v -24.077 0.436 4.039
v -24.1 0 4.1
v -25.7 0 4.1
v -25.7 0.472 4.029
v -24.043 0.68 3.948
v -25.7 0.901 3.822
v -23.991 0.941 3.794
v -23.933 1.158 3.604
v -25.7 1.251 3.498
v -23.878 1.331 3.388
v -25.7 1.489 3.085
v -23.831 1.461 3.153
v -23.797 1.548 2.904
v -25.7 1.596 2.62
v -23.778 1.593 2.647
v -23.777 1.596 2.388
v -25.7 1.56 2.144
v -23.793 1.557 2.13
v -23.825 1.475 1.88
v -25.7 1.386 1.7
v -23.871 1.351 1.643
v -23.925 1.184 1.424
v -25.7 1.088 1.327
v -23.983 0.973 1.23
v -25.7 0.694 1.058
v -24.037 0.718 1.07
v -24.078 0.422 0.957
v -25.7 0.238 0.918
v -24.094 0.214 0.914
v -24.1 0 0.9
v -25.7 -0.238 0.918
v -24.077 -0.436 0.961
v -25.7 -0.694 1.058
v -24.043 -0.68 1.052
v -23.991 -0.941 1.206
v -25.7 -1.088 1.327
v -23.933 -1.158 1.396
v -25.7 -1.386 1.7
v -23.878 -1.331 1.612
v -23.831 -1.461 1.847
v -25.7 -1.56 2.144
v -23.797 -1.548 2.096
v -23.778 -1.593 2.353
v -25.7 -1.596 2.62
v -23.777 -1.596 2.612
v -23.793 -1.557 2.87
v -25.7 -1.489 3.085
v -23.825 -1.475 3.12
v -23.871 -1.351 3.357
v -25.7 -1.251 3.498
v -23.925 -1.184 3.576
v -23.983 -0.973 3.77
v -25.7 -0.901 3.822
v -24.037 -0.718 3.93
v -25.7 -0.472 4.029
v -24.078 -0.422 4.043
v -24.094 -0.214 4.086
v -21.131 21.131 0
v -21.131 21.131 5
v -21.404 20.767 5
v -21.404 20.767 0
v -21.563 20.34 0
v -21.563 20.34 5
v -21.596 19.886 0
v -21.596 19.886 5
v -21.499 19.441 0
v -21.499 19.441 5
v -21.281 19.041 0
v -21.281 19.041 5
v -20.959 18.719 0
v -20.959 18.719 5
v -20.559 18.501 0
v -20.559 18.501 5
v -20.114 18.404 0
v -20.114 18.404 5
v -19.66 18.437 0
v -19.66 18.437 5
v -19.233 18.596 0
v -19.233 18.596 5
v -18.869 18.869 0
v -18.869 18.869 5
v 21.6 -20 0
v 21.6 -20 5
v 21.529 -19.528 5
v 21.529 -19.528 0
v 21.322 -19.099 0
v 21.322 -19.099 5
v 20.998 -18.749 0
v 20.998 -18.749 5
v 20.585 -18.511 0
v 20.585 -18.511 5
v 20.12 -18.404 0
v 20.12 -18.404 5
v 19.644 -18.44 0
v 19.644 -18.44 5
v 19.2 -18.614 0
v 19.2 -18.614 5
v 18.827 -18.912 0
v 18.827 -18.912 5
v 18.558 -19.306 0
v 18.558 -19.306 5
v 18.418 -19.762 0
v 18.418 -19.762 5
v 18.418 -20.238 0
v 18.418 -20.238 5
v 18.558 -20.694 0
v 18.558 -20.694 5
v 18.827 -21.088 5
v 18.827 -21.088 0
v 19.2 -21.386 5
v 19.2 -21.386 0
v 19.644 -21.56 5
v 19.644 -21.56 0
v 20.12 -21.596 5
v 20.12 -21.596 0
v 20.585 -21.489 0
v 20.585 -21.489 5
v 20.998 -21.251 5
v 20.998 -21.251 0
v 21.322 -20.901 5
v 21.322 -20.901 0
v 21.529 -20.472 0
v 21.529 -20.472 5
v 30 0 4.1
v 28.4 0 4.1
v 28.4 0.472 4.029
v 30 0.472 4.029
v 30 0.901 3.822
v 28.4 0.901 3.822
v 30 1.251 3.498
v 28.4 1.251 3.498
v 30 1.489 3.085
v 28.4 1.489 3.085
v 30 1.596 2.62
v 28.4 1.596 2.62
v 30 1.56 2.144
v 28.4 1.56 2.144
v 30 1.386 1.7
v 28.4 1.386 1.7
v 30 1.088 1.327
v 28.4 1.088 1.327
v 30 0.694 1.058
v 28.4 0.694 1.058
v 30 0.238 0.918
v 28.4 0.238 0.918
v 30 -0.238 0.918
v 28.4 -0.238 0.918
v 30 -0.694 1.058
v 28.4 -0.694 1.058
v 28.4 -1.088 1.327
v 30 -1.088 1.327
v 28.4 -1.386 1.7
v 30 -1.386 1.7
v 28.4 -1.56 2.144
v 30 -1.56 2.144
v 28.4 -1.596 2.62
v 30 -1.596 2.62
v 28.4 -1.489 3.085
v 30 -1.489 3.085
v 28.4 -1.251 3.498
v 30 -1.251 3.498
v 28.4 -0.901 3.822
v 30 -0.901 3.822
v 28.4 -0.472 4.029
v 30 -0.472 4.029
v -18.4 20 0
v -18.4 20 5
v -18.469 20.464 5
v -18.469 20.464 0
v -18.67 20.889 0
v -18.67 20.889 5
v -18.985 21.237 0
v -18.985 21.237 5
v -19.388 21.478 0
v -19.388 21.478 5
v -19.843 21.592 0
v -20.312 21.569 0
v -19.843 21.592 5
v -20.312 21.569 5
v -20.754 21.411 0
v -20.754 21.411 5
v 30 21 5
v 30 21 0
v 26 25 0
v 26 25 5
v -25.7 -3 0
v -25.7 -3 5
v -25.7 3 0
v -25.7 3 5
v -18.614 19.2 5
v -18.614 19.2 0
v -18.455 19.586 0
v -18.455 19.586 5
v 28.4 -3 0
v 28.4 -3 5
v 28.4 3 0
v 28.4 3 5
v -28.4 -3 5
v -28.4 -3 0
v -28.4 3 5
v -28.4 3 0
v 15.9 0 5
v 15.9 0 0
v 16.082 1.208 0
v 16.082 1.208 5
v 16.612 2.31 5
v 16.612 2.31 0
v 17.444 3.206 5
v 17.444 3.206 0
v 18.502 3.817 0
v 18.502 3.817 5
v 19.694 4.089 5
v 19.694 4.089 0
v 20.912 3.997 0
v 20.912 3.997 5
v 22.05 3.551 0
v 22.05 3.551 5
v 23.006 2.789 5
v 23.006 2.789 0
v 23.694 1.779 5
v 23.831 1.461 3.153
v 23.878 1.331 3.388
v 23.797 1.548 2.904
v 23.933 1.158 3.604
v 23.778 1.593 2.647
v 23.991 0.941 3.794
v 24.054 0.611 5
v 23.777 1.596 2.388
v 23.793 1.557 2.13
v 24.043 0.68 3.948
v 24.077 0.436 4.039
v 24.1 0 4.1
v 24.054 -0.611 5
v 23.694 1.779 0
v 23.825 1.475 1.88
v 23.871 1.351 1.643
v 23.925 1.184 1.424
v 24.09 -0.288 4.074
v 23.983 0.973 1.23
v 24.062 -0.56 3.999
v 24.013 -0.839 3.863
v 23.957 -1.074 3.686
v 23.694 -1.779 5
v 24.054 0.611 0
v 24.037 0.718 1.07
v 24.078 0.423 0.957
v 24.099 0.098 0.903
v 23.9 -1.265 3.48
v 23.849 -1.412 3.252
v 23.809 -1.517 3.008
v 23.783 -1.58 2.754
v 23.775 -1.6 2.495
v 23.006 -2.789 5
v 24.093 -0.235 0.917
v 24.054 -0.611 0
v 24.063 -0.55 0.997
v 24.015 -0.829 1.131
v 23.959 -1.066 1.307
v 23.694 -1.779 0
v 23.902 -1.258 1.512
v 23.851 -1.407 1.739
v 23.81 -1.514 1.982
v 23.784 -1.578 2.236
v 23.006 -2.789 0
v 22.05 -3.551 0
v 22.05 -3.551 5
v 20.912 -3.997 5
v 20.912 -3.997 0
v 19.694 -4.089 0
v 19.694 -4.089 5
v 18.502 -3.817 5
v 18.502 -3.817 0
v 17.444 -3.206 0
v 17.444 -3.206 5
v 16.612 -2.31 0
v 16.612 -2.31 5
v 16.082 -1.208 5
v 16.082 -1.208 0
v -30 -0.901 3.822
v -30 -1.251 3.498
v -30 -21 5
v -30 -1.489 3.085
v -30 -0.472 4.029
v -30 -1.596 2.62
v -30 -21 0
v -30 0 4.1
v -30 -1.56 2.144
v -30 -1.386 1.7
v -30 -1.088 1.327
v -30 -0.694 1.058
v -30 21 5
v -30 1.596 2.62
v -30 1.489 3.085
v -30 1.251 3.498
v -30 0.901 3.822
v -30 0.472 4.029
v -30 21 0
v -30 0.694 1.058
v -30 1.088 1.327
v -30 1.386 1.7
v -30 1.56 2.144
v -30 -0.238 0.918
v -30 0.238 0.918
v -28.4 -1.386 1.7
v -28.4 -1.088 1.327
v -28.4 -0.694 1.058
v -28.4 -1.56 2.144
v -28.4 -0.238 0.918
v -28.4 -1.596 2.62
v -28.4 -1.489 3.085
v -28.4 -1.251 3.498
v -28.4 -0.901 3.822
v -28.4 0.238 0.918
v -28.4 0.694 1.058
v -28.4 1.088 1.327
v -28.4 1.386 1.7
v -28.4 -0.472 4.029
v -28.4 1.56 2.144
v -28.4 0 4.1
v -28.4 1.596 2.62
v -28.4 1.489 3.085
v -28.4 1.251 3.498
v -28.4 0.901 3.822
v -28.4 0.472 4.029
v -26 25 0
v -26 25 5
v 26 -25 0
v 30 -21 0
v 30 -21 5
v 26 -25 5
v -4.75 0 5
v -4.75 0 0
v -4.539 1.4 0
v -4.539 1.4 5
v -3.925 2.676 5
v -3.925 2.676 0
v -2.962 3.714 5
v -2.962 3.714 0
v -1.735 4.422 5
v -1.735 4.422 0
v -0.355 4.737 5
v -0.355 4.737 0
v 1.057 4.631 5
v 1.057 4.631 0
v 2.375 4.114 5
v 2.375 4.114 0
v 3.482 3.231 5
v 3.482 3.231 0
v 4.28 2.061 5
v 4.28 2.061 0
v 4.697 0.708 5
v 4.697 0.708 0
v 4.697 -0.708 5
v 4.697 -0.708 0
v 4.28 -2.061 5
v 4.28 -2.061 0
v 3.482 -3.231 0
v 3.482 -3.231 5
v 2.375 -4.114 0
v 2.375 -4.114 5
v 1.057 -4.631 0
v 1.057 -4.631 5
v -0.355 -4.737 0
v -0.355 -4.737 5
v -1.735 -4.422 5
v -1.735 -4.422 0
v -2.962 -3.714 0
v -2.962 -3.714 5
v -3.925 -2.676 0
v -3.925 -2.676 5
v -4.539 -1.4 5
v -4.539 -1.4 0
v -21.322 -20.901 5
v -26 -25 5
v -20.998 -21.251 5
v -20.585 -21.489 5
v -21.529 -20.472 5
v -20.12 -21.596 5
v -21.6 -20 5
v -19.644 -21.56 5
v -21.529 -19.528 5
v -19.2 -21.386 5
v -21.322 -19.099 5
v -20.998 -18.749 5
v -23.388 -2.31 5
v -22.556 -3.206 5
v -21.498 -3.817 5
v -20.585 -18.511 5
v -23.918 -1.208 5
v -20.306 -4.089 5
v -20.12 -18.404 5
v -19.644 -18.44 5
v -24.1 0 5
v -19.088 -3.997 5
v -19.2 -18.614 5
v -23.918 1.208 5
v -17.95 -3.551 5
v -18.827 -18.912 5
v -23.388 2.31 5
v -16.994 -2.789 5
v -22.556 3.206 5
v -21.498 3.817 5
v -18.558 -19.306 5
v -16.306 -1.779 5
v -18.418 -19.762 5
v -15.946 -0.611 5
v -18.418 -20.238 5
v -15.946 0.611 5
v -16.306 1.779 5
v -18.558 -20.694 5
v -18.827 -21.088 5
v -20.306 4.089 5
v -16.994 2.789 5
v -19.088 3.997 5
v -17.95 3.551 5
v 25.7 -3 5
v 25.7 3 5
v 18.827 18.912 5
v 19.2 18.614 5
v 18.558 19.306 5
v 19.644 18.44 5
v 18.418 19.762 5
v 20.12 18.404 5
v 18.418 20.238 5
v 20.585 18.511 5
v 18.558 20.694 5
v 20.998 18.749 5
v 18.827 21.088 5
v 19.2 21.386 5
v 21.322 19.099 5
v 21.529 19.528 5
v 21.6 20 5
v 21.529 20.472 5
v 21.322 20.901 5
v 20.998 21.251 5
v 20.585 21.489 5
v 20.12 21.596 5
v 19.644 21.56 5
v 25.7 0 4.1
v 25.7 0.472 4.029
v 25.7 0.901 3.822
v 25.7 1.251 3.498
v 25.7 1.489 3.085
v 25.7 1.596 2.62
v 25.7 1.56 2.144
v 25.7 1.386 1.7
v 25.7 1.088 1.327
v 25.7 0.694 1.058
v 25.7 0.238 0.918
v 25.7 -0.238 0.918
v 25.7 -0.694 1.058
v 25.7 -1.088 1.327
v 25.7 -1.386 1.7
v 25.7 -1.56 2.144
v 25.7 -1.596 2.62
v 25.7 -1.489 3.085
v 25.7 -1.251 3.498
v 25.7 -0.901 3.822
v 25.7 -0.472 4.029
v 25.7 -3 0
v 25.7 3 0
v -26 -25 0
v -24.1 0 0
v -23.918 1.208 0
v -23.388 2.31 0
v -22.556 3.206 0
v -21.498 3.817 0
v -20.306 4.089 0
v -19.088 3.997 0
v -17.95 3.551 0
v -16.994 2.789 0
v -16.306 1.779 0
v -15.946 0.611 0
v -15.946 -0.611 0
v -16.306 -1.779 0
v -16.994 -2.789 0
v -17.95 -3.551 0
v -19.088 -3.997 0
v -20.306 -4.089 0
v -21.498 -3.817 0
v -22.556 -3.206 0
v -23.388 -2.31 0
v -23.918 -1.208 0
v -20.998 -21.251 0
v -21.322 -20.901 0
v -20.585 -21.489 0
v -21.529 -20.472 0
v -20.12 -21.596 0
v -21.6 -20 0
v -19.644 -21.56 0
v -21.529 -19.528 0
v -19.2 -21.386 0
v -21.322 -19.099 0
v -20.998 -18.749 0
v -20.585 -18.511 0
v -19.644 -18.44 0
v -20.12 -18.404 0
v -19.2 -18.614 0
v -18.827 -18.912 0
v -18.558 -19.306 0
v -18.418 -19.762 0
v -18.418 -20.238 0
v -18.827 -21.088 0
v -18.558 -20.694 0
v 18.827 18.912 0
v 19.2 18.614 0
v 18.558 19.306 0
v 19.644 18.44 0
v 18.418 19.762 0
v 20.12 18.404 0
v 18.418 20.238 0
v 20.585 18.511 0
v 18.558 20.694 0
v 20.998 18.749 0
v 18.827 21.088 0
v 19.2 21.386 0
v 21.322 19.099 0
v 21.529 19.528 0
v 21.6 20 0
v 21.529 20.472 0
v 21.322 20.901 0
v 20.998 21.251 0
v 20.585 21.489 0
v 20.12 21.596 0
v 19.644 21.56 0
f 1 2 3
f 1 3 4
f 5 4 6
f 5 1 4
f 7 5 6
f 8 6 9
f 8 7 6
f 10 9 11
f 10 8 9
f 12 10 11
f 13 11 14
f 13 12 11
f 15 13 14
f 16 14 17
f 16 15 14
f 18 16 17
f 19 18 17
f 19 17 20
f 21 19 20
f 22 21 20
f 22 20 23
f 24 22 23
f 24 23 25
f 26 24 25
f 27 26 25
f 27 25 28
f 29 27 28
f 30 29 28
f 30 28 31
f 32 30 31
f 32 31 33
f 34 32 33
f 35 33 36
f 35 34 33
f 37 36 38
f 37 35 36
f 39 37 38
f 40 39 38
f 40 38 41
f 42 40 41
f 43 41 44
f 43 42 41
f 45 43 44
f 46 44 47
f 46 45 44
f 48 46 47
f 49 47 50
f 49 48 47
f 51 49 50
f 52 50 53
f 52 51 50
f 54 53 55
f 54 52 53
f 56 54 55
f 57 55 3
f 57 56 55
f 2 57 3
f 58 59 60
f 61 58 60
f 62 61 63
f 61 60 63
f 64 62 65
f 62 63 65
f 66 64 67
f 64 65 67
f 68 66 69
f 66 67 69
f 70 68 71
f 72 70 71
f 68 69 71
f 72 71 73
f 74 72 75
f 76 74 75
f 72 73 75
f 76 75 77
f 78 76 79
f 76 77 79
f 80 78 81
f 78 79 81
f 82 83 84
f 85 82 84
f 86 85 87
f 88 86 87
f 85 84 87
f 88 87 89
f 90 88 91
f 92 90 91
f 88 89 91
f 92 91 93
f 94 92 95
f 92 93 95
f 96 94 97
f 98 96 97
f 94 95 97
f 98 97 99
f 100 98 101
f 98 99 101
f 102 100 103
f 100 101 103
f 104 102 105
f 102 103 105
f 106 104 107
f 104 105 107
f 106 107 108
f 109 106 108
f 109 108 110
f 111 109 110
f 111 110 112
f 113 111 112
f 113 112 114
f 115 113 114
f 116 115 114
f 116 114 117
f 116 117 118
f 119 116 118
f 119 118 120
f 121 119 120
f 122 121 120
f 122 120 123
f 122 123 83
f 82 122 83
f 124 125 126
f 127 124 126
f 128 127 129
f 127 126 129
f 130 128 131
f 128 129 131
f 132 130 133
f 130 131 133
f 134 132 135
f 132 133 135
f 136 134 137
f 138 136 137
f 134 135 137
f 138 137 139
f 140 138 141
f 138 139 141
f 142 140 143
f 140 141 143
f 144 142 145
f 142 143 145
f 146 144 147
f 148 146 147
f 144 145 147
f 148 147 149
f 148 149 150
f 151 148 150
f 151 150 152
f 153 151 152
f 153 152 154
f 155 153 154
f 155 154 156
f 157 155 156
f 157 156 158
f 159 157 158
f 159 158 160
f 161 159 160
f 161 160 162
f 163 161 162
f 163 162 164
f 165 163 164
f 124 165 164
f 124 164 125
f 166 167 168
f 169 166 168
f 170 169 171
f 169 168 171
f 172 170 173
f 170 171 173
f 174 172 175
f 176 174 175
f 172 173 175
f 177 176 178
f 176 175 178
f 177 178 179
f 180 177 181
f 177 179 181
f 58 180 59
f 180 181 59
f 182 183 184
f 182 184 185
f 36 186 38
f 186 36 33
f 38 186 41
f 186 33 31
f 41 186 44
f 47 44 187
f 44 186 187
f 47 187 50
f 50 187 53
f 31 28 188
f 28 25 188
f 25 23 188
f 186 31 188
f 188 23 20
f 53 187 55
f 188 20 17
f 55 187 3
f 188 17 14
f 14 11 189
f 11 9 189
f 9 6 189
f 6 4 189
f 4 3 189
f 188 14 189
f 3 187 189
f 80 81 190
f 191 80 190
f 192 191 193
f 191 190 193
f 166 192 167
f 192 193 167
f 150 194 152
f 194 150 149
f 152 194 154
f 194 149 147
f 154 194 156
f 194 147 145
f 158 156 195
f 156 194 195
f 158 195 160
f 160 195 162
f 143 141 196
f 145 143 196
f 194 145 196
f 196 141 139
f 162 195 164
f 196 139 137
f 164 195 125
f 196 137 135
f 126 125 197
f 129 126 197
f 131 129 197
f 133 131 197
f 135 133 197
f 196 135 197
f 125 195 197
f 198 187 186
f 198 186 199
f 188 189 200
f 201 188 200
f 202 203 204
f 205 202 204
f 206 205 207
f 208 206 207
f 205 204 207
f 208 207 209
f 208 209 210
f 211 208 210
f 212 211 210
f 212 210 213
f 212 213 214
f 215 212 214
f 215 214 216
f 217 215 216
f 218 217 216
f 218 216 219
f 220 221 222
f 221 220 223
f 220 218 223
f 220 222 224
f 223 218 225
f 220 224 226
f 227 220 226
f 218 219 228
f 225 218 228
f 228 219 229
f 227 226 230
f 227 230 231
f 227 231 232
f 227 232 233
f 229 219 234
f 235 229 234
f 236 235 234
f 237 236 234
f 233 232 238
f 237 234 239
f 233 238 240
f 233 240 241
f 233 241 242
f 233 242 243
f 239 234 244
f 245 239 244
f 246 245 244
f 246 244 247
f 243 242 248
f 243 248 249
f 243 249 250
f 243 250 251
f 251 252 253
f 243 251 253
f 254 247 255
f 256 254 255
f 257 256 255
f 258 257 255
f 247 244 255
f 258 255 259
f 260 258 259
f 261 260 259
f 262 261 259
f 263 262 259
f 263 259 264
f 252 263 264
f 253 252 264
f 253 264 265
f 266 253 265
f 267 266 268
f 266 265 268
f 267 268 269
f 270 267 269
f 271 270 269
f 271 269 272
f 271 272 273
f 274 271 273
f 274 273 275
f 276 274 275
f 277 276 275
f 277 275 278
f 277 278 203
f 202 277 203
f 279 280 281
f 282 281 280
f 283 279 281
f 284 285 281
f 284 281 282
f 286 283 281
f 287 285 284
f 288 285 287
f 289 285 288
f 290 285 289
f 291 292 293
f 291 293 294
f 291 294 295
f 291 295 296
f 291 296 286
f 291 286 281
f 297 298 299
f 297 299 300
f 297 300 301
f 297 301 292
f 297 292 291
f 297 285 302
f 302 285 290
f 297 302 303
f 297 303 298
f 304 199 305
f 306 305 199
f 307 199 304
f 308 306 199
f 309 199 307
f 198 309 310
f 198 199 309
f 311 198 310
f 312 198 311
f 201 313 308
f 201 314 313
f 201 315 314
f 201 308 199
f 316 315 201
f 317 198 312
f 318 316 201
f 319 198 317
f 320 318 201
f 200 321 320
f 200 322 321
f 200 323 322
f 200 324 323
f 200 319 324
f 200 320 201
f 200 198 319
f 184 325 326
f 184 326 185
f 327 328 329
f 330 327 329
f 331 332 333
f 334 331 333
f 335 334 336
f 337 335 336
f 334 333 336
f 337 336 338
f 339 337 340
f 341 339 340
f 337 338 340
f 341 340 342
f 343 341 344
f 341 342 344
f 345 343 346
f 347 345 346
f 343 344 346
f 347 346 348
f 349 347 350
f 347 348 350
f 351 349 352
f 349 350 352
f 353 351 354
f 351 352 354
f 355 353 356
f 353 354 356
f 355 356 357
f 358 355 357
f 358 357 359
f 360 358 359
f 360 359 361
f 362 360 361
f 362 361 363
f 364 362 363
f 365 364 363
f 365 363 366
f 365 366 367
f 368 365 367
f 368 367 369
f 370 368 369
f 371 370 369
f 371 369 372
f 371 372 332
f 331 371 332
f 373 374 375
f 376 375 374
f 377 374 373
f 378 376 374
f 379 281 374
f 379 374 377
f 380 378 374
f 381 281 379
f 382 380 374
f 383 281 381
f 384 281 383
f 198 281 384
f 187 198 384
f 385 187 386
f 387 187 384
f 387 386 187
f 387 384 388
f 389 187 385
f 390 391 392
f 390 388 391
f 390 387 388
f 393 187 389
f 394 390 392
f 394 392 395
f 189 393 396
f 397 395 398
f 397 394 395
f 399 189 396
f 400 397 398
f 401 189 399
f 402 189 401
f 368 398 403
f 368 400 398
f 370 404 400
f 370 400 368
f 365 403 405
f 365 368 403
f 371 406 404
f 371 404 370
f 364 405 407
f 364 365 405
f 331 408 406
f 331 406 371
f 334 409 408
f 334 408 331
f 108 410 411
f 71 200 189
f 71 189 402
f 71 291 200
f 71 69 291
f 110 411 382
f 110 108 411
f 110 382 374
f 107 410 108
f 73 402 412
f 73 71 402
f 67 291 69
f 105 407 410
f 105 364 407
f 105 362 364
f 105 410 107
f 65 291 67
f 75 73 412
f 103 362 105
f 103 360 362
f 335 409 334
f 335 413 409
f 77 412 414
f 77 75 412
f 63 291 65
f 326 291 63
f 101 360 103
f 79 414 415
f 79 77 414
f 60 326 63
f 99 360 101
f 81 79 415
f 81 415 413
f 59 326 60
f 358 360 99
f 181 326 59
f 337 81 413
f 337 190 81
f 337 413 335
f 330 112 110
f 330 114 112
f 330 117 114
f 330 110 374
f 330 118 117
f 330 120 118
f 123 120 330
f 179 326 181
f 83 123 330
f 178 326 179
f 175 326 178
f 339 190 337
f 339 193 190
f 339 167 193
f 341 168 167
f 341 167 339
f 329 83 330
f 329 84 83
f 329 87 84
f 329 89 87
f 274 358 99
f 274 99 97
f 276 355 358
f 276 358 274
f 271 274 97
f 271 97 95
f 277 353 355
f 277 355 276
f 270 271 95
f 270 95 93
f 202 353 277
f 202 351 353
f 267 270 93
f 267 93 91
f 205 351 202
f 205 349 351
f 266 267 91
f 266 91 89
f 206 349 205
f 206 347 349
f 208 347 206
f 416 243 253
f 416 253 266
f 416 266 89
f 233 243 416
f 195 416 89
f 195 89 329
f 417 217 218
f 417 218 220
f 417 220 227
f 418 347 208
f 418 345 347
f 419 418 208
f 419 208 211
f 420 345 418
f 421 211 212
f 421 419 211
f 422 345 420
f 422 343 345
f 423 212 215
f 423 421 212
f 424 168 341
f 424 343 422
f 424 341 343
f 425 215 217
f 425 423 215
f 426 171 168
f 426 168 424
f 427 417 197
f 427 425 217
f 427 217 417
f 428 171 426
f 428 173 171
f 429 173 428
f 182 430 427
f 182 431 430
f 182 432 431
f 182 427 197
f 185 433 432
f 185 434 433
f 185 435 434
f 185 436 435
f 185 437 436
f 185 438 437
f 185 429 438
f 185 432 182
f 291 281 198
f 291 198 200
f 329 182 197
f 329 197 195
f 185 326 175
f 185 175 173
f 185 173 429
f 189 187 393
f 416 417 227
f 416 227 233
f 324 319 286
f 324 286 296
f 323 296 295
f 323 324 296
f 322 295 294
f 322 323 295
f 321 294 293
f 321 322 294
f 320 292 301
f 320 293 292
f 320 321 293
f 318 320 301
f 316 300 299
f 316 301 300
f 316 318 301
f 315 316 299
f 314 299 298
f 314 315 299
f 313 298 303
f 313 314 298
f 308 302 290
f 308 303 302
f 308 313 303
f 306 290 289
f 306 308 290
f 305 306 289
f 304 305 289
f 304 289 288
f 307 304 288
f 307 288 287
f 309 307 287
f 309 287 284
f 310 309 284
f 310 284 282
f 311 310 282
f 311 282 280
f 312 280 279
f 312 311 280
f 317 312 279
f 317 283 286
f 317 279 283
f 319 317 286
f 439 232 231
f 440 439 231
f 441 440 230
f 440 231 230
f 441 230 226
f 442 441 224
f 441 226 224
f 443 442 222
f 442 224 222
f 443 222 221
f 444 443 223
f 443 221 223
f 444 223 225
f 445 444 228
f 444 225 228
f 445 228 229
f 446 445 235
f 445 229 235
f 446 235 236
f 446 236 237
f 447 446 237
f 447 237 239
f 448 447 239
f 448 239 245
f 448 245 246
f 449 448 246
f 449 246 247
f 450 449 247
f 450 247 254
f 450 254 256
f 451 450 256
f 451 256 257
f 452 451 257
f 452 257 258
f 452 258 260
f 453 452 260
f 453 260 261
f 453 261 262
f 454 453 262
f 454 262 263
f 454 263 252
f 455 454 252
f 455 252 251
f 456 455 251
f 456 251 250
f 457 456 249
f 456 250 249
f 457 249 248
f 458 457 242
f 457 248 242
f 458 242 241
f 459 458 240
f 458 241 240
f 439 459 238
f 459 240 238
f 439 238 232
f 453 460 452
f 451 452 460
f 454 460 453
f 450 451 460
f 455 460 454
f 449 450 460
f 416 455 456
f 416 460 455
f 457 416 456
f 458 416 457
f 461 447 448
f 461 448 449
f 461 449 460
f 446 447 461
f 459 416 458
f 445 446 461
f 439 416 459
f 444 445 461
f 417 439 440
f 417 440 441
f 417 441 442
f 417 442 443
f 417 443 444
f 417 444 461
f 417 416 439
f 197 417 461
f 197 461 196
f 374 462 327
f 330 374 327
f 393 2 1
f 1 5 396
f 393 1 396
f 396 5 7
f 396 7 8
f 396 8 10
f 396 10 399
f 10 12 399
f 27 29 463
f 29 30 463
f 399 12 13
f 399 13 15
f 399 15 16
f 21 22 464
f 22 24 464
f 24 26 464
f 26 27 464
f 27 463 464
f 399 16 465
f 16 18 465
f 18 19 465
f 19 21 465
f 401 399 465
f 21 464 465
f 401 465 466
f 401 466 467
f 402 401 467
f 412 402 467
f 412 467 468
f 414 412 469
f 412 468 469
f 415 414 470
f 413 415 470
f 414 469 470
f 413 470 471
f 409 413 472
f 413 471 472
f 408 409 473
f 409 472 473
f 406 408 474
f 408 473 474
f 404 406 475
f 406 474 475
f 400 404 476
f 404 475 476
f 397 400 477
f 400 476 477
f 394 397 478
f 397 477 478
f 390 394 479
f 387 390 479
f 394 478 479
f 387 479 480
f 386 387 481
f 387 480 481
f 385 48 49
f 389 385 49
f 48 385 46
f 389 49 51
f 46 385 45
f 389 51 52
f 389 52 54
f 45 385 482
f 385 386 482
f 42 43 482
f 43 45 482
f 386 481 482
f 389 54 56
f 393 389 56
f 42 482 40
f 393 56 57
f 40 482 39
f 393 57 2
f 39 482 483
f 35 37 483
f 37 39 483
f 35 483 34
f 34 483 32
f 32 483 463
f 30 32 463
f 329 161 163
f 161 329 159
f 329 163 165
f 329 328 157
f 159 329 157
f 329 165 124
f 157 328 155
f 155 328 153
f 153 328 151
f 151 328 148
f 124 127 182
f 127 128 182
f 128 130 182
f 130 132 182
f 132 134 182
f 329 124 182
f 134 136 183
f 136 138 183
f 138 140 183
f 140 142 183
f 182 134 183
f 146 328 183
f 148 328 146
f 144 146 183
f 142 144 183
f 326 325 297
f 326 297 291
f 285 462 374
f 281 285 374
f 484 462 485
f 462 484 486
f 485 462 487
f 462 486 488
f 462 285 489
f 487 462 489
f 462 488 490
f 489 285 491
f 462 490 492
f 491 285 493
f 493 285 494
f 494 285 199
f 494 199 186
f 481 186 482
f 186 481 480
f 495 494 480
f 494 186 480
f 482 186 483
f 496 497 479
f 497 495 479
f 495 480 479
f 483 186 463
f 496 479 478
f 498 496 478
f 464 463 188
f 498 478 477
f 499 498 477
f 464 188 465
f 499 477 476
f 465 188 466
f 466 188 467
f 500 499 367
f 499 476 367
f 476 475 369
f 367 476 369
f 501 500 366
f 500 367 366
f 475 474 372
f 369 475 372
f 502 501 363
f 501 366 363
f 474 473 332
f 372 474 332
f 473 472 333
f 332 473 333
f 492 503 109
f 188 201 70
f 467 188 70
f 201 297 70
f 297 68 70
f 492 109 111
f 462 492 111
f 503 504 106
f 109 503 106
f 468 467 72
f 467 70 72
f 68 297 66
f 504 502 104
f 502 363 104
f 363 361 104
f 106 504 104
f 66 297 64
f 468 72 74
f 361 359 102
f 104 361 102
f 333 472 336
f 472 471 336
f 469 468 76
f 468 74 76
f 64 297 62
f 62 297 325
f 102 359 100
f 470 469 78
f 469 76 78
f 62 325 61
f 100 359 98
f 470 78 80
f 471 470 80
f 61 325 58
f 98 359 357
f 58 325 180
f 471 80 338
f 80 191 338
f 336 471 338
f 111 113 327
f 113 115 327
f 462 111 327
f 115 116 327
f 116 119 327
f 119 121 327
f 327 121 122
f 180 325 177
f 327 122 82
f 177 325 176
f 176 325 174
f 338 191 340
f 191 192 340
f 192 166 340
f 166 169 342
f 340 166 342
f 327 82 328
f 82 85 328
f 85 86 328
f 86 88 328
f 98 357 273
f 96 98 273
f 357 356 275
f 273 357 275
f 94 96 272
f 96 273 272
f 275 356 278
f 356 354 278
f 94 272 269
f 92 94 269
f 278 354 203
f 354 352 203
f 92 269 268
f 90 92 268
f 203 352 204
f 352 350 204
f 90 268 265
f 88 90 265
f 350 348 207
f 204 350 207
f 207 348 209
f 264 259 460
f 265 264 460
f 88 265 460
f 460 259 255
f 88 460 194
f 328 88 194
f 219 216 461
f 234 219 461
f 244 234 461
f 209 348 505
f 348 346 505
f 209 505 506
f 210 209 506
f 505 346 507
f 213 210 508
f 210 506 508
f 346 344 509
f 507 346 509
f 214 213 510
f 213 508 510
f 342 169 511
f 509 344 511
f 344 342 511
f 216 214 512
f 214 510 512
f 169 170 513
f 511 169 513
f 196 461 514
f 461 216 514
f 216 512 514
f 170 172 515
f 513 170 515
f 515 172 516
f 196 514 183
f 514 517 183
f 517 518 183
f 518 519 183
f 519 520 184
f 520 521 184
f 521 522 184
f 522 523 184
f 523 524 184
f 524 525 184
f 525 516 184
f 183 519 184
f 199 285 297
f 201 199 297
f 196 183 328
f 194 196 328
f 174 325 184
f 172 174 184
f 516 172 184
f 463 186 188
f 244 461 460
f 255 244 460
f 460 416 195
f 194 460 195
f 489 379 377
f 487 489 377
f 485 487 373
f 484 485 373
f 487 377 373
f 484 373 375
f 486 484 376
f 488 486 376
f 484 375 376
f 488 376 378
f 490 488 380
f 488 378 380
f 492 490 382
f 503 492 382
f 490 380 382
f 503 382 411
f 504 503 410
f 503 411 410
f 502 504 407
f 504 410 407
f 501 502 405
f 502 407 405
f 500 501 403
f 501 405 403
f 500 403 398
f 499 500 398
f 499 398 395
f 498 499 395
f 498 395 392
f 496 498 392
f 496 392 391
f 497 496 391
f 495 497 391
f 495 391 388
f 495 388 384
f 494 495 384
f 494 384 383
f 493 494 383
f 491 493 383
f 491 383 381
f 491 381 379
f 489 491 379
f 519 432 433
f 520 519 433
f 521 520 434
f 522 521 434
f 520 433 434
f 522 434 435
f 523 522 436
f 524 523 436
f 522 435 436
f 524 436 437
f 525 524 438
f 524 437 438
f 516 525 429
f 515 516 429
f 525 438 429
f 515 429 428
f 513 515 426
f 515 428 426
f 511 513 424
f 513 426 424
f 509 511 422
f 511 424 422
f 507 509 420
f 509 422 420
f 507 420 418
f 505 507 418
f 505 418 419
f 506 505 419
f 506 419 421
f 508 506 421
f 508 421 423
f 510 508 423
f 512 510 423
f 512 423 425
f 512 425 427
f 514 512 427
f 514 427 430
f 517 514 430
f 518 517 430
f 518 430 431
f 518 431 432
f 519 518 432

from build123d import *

# Parameters (mm, degrees)
SKETCH_1_W          = 60
SKETCH_1_H          = 50
EXTRUDE_1_DEPTH     = 5
HOLE_WIZARD_1_D     = 9.5
HOLE_WIZARD_1_DEPTH = 20
CHAMFER_1_SIZE      = 4
SKETCH_15_R         = 1.6
CUT_EXTRUDE_1_DEPTH = 40.37003937
HOLE_WIZARD_2_D     = 8.2
SKETCH_19_W         = 2.7
SKETCH_19_H         = 6
CUT_EXTRUDE_2_DEPTH = 10
HOLE_WIZARD_3_D     = 3.2
HOLE_WIZARD_3_DEPTH = 10


with BuildPart() as part:
    # 草图1 → 凸台-拉伸1 (new body)
    with BuildSketch(Plane.XY):
        Rectangle(SKETCH_1_W, SKETCH_1_H)
    extrude(amount=EXTRUDE_1_DEPTH)

    # 孔1
    with Locations(Plane.XY.offset(5)):
        with Locations((0, 0)):
            Hole(HOLE_WIZARD_1_D / 2, depth=HOLE_WIZARD_1_DEPTH)

    # 倒角1
    chamfer_1_edges = [part.edges().sort_by_distance(p)[0] for p in [
        (30, -25, 2.5),
        (-30, -25, 2.5),
        (-30, 25, 2.5),
        (30, 25, 2.5),
    ]]
    chamfer(chamfer_1_edges, length=CHAMFER_1_SIZE)

    # 草图15 → 切除-拉伸1 (cut, through all)
    with BuildSketch(Plane.XY.offset(5)):
        with BuildLine():
            ThreePointArc((-21.13137085, 21.13137085), (-21.13137085, 18.86862915), (-18.86862915, 18.86862915))
            Line((-18.86862915, 18.86862915), (-21.13137085, 21.13137085))
        make_face()
        with BuildLine():
            Line((-21.13137085, 21.13137085), (-18.86862915, 18.86862915))
            ThreePointArc((-18.86862915, 18.86862915), (-18.521792748, 19.387706508), (-18.4, 20))
            ThreePointArc((-18.4, 20), (-19.387706508, 21.478207252), (-21.13137085, 21.13137085))
        make_face()
        with Locations((20, 20)):
            Circle(SKETCH_15_R)
        with Locations((20, -20)):
            Circle(SKETCH_15_R)
        with Locations(Location((-20, -20, 0), (0, 0, 180))):
            Circle(SKETCH_15_R)
    extrude(amount=-CUT_EXTRUDE_1_DEPTH, mode=Mode.SUBTRACT)

    # 孔2 (through all)
    with Locations(Plane.XY.offset(5)):
        with Locations((-20, 0), (20, 0)):
            Hole(HOLE_WIZARD_2_D / 2)

    # 草图19 → 切除-拉伸2 (cut)
    with BuildSketch(Plane.XY.offset(5)):
        with Locations((27.05, 0)):
            Rectangle(SKETCH_19_W, SKETCH_19_H)
    cut_extrude_2 = extrude(amount=-CUT_EXTRUDE_2_DEPTH, mode=Mode.SUBTRACT)

    # 孔3
    with Locations(Plane(origin=(30, 0, 0), x_dir=(0, 0, -1), z_dir=(1, 0, 0))):
        with Locations((-2.5, 0)):
            hole_wizard_3 = Hole(HOLE_WIZARD_3_D / 2, depth=HOLE_WIZARD_3_DEPTH)

    # 镜向1: 切除-拉伸2, 孔3 across plane
    add(cut_extrude_2.mirror(Plane(origin=(0, 0, 0), x_dir=(0, 0, 1), z_dir=(1, 0, 0))), mode=Mode.SUBTRACT)
    add(hole_wizard_3.mirror(Plane(origin=(0, 0, 0), x_dir=(0, 0, 1), z_dir=(1, 0, 0))), mode=Mode.SUBTRACT)


solid = part.part
